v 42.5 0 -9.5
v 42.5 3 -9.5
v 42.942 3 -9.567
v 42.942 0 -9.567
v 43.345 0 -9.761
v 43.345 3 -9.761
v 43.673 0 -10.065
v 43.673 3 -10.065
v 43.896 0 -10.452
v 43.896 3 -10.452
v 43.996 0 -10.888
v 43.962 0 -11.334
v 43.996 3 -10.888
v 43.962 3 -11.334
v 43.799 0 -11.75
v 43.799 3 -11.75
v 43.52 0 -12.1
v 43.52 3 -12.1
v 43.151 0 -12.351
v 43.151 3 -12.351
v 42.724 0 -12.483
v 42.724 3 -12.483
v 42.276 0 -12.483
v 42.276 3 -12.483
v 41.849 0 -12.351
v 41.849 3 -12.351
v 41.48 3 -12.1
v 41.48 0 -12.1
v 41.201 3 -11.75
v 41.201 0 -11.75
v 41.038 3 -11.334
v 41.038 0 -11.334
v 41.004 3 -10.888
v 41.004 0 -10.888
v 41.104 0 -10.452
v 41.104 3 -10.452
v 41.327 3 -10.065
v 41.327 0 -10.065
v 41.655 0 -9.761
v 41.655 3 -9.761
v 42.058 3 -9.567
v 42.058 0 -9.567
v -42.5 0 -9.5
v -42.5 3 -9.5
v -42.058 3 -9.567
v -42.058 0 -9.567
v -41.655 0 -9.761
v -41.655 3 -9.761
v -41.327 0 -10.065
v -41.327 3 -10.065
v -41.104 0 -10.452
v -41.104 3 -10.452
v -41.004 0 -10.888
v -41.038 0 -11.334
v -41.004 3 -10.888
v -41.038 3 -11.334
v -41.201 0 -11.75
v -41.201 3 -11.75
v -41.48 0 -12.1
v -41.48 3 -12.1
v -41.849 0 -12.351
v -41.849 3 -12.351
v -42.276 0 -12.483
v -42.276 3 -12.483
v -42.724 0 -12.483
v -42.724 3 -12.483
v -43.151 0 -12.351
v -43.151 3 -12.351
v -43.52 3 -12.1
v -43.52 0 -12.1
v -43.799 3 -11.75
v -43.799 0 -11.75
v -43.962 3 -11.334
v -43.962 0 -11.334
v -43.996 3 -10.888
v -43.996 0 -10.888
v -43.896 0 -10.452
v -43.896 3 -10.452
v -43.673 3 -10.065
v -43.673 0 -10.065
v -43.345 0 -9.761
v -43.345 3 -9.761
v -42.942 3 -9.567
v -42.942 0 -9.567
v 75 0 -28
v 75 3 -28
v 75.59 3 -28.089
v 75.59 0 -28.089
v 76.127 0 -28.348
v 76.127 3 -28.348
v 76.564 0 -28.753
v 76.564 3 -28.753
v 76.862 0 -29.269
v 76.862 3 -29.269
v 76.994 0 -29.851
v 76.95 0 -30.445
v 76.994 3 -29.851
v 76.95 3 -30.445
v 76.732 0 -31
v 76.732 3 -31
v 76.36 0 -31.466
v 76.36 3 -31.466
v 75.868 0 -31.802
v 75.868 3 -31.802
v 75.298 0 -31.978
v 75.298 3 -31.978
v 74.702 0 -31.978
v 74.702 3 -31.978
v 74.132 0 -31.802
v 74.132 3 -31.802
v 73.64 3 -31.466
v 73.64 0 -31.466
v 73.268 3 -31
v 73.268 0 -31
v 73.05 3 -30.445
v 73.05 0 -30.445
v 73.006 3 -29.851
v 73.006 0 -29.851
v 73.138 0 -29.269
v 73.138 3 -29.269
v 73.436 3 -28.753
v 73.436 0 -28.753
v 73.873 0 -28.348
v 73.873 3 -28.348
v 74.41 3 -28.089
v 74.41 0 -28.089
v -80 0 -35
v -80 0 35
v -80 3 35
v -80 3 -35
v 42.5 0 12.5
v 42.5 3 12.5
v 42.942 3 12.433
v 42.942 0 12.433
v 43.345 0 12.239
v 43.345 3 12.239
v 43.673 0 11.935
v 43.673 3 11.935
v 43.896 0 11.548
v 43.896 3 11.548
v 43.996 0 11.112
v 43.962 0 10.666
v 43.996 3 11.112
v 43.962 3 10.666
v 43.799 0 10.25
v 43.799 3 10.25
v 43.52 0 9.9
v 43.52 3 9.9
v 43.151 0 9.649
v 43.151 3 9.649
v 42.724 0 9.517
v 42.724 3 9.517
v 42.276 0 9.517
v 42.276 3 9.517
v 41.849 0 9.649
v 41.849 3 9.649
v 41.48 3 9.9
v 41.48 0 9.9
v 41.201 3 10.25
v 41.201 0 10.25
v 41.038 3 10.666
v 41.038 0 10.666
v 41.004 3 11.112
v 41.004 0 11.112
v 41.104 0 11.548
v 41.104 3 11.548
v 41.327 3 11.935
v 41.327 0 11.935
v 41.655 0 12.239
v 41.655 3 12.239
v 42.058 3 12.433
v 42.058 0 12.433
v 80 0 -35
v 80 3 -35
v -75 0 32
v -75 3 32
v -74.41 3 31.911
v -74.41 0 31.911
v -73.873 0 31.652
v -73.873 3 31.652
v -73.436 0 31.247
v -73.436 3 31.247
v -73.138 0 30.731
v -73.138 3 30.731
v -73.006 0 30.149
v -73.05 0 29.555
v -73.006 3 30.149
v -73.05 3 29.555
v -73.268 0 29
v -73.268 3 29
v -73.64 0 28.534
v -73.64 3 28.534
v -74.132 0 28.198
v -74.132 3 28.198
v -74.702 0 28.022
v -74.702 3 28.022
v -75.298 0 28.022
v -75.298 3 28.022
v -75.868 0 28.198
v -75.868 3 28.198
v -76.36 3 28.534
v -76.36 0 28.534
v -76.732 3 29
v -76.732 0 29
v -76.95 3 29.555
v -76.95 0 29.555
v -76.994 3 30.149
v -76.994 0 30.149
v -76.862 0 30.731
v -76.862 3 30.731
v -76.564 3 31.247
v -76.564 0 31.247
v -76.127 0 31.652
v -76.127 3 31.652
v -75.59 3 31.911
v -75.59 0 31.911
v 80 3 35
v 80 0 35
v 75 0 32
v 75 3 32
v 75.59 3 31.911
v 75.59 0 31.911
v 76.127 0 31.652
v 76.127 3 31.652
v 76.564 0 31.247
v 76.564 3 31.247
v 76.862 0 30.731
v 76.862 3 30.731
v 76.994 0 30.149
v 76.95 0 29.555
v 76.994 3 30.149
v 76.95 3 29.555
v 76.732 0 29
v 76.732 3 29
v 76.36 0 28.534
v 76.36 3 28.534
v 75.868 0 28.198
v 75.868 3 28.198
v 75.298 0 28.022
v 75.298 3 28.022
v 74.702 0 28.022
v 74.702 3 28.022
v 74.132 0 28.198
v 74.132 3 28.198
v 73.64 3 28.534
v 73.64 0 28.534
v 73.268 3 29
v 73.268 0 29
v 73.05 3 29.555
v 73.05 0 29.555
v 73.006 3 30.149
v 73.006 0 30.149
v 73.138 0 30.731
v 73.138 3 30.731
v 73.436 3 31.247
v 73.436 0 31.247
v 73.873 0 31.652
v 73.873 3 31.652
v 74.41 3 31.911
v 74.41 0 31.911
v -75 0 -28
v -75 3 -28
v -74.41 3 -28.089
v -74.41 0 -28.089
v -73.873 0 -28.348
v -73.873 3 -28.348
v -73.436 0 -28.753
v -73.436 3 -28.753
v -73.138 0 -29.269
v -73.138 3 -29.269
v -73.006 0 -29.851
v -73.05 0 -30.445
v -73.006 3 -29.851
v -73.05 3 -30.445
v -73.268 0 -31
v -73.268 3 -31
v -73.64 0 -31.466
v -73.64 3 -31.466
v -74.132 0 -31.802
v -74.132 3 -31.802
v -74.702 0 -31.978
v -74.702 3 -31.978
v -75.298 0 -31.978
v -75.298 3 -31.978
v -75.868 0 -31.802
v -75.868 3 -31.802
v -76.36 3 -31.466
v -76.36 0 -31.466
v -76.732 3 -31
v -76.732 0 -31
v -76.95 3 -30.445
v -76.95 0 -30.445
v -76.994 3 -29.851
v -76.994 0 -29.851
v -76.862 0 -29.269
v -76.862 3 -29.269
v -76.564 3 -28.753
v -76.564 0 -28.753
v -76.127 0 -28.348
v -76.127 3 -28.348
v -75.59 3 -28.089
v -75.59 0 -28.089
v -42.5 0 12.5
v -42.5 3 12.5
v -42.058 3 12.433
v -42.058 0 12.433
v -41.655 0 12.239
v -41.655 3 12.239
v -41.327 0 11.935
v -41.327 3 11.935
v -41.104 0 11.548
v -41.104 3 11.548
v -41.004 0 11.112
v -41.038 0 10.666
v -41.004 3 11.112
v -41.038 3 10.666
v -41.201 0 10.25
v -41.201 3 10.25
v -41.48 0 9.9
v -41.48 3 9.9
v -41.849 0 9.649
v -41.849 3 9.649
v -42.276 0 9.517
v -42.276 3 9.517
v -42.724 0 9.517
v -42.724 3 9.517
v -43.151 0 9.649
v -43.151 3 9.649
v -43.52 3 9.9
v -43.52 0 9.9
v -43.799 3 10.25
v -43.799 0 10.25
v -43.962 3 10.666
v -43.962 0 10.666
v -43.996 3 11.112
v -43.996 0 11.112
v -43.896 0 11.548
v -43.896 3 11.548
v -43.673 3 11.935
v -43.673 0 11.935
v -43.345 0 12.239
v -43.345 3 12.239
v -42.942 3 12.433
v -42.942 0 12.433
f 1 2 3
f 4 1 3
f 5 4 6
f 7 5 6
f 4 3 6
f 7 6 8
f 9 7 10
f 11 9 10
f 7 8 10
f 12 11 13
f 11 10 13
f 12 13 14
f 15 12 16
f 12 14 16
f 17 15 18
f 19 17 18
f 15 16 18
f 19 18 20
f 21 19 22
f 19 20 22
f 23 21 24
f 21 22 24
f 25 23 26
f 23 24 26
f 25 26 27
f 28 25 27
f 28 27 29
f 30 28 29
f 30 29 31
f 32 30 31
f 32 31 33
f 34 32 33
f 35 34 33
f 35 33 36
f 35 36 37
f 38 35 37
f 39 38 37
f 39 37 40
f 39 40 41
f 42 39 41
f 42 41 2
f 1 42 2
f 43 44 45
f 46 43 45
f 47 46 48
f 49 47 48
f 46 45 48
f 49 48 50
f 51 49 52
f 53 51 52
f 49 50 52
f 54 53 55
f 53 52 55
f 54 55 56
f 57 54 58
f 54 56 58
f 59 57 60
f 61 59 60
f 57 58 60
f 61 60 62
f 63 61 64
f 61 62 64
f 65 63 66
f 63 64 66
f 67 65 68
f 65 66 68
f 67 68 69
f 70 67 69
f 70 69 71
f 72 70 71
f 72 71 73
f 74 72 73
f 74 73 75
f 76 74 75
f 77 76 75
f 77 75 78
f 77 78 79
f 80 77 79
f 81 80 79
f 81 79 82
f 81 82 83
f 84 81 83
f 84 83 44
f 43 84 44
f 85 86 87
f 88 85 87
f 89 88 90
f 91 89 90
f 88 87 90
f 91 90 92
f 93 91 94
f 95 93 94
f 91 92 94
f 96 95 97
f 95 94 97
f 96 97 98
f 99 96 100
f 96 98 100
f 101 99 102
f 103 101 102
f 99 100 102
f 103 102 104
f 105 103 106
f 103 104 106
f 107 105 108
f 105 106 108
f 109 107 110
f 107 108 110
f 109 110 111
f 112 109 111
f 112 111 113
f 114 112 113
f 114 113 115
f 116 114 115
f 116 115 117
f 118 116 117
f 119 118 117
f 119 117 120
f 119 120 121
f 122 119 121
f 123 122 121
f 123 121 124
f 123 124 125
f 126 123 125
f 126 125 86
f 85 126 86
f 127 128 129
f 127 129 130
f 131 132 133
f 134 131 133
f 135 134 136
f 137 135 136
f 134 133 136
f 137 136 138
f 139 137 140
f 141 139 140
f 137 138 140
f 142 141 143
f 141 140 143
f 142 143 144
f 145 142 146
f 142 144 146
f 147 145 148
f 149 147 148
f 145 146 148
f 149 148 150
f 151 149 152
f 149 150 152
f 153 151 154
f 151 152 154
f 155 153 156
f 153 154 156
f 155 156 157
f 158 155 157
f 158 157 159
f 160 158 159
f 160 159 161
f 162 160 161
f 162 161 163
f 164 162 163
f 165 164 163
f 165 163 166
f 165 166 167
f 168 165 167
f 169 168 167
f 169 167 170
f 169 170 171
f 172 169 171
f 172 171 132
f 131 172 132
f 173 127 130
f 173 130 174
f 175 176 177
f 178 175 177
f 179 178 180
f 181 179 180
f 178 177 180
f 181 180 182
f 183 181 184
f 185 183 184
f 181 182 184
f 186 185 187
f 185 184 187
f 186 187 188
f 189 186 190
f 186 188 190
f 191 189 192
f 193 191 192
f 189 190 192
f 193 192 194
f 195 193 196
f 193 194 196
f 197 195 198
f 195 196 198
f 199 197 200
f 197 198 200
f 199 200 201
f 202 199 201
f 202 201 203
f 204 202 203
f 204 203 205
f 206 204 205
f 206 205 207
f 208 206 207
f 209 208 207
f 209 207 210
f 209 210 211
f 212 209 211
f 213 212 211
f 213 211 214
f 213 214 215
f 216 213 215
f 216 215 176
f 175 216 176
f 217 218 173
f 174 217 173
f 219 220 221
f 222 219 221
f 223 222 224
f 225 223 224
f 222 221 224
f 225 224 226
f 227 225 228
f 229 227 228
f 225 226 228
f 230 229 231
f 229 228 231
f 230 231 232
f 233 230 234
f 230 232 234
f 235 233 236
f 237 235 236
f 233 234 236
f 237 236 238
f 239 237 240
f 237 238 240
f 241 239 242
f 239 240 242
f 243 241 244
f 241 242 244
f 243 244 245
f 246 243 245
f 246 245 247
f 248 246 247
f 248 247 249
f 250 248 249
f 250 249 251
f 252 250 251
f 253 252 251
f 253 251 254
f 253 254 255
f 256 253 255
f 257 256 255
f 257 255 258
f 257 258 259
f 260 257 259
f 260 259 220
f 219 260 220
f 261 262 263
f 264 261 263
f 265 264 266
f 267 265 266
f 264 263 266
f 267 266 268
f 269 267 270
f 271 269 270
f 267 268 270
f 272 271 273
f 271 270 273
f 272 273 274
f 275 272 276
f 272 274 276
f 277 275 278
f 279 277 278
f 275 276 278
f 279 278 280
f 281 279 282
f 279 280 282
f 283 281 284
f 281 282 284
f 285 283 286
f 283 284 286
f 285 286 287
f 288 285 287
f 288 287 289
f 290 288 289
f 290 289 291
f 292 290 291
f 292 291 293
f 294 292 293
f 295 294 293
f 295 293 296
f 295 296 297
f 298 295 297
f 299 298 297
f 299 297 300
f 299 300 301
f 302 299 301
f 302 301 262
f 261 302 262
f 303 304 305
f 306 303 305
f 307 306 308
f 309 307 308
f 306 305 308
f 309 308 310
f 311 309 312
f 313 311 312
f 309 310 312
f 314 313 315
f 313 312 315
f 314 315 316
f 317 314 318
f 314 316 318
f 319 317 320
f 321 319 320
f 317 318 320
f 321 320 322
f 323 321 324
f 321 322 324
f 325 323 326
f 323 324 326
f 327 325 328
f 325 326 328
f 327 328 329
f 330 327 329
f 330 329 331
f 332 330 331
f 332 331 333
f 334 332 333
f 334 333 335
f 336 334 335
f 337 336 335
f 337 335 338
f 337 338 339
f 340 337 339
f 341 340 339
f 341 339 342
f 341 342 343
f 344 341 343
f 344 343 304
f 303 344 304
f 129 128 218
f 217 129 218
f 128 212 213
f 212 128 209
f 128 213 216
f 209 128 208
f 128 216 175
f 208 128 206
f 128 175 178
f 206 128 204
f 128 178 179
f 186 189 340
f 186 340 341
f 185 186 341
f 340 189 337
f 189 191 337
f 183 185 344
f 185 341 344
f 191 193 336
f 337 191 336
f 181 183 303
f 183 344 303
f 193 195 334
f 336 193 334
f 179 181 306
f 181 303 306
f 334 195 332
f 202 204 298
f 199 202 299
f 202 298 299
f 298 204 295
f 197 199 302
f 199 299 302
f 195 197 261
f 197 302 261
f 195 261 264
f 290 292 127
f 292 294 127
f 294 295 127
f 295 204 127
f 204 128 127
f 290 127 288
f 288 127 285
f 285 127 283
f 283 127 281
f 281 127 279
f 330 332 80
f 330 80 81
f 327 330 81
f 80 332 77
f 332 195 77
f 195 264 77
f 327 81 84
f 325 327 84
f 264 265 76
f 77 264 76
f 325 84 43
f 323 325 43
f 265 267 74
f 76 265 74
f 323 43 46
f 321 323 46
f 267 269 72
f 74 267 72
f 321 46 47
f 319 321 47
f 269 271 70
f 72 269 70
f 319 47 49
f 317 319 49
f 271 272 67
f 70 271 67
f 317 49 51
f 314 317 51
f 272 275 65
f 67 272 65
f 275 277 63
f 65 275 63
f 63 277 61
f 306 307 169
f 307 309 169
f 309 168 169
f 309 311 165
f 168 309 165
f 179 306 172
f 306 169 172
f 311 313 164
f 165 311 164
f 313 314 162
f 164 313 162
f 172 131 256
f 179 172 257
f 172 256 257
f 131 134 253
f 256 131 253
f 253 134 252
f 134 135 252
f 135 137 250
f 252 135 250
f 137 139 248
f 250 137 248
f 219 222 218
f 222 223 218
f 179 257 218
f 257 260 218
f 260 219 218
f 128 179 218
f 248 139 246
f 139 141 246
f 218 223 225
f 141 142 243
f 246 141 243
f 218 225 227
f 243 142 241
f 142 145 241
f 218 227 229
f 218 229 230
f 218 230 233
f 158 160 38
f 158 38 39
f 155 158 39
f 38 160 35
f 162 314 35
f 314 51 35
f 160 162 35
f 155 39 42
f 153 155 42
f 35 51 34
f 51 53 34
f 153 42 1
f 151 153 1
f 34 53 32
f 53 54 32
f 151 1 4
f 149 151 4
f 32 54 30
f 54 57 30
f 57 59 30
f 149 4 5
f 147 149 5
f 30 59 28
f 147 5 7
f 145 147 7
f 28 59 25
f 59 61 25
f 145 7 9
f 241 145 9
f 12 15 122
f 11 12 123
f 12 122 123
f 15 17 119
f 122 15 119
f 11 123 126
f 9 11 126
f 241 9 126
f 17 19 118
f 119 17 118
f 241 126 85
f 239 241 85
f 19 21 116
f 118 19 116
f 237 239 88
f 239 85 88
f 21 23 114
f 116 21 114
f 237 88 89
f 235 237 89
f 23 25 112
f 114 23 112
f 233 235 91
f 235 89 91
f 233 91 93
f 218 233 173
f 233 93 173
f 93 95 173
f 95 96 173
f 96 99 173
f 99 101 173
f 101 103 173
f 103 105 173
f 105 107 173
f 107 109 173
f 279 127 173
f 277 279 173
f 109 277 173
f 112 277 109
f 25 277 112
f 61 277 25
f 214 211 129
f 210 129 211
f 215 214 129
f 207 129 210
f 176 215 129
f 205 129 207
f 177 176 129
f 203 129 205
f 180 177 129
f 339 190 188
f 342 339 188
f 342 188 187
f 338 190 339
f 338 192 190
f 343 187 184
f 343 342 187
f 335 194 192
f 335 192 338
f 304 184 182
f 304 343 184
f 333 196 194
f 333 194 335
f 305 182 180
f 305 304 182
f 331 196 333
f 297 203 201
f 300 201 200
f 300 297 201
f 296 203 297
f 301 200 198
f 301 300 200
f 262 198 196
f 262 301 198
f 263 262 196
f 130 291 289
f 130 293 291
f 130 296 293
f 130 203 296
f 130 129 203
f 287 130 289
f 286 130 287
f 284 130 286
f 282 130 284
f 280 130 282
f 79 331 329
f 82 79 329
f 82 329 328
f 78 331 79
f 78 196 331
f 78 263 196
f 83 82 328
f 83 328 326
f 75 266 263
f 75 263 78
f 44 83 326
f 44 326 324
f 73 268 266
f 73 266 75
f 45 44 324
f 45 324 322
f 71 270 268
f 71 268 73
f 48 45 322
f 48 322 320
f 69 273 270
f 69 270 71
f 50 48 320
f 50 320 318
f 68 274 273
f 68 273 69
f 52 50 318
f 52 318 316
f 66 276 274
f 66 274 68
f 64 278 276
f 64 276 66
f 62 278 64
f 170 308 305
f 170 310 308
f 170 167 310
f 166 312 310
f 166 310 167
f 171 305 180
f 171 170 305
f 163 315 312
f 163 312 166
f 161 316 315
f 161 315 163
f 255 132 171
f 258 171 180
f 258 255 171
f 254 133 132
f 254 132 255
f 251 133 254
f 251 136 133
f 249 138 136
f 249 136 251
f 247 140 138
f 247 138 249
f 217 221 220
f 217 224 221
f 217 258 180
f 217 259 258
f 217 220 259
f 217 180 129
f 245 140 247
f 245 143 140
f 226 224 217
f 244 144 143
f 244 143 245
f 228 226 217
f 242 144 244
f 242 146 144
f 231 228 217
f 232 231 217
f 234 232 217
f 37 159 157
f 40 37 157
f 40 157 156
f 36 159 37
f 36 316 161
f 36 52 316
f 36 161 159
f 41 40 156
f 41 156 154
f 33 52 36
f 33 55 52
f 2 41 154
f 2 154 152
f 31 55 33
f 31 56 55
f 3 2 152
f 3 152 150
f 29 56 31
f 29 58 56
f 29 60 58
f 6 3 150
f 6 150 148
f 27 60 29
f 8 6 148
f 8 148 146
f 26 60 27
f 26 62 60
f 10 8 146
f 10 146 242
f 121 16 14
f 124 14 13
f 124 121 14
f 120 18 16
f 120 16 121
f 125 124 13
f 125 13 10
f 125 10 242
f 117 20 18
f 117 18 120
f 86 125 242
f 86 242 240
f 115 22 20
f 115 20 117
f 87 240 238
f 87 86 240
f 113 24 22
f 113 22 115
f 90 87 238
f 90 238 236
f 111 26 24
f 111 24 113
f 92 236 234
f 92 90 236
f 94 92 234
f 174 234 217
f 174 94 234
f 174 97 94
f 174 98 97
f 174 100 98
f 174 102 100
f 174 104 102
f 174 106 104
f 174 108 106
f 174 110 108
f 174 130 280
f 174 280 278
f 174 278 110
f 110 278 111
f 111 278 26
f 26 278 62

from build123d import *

# Parameters (mm, degrees)
SKETCH1_W      = 160
SKETCH1_H      = 70
EXTRUDE1_DEPTH = 3
SKETCH2_R      = 2
EXTRUDE2_DEPTH = 120
SKETCH3_R      = 1.5
EXTRUDE3_DEPTH = 10


with BuildPart() as part:
    # Sketch1 → Extrude1 (new body)
    with BuildSketch(Plane(origin=(0, 0, 0), x_dir=(1, 0, 0), z_dir=(0, 1, 0))):
        Rectangle(SKETCH1_W, SKETCH1_H)
    extrude(amount=EXTRUDE1_DEPTH)

    # Sketch2 → Extrude2 (cut)
    with BuildSketch(Plane(origin=(0, 3, 0), x_dir=(1, 0, 0), z_dir=(0, 1, 0))):
        with Locations(Location((-75, 30, 0), (0, 0, 270))):
            Circle(SKETCH2_R)
        with Locations(Location((-75, -30, 0), (0, 0, 270))):
            Circle(SKETCH2_R)
        with Locations(Location((75, -30, 0), (0, 0, 270))):
            Circle(SKETCH2_R)
        with Locations(Location((75, 30, 0), (0, 0, 270))):
            Circle(SKETCH2_R)
    extrude(amount=-EXTRUDE2_DEPTH, mode=Mode.SUBTRACT)

    # Sketch3 → Extrude3 (cut)
    with BuildSketch(Plane(origin=(0, 3, 0), x_dir=(1, 0, 0), z_dir=(0, 1, 0))):
        with Locations(Location((-42.5, 11, 0), (0, 0, 270))):
            Circle(SKETCH3_R)
        with Locations(Location((-42.5, -11, 0), (0, 0, 270))):
            Circle(SKETCH3_R)
        with Locations(Location((42.5, -11, 0), (0, 0, 270))):
            Circle(SKETCH3_R)
        with Locations(Location((42.5, 11, 0), (0, 0, 270))):
            Circle(SKETCH3_R)
    extrude(amount=-EXTRUDE3_DEPTH, mode=Mode.SUBTRACT)


solid = part.part
